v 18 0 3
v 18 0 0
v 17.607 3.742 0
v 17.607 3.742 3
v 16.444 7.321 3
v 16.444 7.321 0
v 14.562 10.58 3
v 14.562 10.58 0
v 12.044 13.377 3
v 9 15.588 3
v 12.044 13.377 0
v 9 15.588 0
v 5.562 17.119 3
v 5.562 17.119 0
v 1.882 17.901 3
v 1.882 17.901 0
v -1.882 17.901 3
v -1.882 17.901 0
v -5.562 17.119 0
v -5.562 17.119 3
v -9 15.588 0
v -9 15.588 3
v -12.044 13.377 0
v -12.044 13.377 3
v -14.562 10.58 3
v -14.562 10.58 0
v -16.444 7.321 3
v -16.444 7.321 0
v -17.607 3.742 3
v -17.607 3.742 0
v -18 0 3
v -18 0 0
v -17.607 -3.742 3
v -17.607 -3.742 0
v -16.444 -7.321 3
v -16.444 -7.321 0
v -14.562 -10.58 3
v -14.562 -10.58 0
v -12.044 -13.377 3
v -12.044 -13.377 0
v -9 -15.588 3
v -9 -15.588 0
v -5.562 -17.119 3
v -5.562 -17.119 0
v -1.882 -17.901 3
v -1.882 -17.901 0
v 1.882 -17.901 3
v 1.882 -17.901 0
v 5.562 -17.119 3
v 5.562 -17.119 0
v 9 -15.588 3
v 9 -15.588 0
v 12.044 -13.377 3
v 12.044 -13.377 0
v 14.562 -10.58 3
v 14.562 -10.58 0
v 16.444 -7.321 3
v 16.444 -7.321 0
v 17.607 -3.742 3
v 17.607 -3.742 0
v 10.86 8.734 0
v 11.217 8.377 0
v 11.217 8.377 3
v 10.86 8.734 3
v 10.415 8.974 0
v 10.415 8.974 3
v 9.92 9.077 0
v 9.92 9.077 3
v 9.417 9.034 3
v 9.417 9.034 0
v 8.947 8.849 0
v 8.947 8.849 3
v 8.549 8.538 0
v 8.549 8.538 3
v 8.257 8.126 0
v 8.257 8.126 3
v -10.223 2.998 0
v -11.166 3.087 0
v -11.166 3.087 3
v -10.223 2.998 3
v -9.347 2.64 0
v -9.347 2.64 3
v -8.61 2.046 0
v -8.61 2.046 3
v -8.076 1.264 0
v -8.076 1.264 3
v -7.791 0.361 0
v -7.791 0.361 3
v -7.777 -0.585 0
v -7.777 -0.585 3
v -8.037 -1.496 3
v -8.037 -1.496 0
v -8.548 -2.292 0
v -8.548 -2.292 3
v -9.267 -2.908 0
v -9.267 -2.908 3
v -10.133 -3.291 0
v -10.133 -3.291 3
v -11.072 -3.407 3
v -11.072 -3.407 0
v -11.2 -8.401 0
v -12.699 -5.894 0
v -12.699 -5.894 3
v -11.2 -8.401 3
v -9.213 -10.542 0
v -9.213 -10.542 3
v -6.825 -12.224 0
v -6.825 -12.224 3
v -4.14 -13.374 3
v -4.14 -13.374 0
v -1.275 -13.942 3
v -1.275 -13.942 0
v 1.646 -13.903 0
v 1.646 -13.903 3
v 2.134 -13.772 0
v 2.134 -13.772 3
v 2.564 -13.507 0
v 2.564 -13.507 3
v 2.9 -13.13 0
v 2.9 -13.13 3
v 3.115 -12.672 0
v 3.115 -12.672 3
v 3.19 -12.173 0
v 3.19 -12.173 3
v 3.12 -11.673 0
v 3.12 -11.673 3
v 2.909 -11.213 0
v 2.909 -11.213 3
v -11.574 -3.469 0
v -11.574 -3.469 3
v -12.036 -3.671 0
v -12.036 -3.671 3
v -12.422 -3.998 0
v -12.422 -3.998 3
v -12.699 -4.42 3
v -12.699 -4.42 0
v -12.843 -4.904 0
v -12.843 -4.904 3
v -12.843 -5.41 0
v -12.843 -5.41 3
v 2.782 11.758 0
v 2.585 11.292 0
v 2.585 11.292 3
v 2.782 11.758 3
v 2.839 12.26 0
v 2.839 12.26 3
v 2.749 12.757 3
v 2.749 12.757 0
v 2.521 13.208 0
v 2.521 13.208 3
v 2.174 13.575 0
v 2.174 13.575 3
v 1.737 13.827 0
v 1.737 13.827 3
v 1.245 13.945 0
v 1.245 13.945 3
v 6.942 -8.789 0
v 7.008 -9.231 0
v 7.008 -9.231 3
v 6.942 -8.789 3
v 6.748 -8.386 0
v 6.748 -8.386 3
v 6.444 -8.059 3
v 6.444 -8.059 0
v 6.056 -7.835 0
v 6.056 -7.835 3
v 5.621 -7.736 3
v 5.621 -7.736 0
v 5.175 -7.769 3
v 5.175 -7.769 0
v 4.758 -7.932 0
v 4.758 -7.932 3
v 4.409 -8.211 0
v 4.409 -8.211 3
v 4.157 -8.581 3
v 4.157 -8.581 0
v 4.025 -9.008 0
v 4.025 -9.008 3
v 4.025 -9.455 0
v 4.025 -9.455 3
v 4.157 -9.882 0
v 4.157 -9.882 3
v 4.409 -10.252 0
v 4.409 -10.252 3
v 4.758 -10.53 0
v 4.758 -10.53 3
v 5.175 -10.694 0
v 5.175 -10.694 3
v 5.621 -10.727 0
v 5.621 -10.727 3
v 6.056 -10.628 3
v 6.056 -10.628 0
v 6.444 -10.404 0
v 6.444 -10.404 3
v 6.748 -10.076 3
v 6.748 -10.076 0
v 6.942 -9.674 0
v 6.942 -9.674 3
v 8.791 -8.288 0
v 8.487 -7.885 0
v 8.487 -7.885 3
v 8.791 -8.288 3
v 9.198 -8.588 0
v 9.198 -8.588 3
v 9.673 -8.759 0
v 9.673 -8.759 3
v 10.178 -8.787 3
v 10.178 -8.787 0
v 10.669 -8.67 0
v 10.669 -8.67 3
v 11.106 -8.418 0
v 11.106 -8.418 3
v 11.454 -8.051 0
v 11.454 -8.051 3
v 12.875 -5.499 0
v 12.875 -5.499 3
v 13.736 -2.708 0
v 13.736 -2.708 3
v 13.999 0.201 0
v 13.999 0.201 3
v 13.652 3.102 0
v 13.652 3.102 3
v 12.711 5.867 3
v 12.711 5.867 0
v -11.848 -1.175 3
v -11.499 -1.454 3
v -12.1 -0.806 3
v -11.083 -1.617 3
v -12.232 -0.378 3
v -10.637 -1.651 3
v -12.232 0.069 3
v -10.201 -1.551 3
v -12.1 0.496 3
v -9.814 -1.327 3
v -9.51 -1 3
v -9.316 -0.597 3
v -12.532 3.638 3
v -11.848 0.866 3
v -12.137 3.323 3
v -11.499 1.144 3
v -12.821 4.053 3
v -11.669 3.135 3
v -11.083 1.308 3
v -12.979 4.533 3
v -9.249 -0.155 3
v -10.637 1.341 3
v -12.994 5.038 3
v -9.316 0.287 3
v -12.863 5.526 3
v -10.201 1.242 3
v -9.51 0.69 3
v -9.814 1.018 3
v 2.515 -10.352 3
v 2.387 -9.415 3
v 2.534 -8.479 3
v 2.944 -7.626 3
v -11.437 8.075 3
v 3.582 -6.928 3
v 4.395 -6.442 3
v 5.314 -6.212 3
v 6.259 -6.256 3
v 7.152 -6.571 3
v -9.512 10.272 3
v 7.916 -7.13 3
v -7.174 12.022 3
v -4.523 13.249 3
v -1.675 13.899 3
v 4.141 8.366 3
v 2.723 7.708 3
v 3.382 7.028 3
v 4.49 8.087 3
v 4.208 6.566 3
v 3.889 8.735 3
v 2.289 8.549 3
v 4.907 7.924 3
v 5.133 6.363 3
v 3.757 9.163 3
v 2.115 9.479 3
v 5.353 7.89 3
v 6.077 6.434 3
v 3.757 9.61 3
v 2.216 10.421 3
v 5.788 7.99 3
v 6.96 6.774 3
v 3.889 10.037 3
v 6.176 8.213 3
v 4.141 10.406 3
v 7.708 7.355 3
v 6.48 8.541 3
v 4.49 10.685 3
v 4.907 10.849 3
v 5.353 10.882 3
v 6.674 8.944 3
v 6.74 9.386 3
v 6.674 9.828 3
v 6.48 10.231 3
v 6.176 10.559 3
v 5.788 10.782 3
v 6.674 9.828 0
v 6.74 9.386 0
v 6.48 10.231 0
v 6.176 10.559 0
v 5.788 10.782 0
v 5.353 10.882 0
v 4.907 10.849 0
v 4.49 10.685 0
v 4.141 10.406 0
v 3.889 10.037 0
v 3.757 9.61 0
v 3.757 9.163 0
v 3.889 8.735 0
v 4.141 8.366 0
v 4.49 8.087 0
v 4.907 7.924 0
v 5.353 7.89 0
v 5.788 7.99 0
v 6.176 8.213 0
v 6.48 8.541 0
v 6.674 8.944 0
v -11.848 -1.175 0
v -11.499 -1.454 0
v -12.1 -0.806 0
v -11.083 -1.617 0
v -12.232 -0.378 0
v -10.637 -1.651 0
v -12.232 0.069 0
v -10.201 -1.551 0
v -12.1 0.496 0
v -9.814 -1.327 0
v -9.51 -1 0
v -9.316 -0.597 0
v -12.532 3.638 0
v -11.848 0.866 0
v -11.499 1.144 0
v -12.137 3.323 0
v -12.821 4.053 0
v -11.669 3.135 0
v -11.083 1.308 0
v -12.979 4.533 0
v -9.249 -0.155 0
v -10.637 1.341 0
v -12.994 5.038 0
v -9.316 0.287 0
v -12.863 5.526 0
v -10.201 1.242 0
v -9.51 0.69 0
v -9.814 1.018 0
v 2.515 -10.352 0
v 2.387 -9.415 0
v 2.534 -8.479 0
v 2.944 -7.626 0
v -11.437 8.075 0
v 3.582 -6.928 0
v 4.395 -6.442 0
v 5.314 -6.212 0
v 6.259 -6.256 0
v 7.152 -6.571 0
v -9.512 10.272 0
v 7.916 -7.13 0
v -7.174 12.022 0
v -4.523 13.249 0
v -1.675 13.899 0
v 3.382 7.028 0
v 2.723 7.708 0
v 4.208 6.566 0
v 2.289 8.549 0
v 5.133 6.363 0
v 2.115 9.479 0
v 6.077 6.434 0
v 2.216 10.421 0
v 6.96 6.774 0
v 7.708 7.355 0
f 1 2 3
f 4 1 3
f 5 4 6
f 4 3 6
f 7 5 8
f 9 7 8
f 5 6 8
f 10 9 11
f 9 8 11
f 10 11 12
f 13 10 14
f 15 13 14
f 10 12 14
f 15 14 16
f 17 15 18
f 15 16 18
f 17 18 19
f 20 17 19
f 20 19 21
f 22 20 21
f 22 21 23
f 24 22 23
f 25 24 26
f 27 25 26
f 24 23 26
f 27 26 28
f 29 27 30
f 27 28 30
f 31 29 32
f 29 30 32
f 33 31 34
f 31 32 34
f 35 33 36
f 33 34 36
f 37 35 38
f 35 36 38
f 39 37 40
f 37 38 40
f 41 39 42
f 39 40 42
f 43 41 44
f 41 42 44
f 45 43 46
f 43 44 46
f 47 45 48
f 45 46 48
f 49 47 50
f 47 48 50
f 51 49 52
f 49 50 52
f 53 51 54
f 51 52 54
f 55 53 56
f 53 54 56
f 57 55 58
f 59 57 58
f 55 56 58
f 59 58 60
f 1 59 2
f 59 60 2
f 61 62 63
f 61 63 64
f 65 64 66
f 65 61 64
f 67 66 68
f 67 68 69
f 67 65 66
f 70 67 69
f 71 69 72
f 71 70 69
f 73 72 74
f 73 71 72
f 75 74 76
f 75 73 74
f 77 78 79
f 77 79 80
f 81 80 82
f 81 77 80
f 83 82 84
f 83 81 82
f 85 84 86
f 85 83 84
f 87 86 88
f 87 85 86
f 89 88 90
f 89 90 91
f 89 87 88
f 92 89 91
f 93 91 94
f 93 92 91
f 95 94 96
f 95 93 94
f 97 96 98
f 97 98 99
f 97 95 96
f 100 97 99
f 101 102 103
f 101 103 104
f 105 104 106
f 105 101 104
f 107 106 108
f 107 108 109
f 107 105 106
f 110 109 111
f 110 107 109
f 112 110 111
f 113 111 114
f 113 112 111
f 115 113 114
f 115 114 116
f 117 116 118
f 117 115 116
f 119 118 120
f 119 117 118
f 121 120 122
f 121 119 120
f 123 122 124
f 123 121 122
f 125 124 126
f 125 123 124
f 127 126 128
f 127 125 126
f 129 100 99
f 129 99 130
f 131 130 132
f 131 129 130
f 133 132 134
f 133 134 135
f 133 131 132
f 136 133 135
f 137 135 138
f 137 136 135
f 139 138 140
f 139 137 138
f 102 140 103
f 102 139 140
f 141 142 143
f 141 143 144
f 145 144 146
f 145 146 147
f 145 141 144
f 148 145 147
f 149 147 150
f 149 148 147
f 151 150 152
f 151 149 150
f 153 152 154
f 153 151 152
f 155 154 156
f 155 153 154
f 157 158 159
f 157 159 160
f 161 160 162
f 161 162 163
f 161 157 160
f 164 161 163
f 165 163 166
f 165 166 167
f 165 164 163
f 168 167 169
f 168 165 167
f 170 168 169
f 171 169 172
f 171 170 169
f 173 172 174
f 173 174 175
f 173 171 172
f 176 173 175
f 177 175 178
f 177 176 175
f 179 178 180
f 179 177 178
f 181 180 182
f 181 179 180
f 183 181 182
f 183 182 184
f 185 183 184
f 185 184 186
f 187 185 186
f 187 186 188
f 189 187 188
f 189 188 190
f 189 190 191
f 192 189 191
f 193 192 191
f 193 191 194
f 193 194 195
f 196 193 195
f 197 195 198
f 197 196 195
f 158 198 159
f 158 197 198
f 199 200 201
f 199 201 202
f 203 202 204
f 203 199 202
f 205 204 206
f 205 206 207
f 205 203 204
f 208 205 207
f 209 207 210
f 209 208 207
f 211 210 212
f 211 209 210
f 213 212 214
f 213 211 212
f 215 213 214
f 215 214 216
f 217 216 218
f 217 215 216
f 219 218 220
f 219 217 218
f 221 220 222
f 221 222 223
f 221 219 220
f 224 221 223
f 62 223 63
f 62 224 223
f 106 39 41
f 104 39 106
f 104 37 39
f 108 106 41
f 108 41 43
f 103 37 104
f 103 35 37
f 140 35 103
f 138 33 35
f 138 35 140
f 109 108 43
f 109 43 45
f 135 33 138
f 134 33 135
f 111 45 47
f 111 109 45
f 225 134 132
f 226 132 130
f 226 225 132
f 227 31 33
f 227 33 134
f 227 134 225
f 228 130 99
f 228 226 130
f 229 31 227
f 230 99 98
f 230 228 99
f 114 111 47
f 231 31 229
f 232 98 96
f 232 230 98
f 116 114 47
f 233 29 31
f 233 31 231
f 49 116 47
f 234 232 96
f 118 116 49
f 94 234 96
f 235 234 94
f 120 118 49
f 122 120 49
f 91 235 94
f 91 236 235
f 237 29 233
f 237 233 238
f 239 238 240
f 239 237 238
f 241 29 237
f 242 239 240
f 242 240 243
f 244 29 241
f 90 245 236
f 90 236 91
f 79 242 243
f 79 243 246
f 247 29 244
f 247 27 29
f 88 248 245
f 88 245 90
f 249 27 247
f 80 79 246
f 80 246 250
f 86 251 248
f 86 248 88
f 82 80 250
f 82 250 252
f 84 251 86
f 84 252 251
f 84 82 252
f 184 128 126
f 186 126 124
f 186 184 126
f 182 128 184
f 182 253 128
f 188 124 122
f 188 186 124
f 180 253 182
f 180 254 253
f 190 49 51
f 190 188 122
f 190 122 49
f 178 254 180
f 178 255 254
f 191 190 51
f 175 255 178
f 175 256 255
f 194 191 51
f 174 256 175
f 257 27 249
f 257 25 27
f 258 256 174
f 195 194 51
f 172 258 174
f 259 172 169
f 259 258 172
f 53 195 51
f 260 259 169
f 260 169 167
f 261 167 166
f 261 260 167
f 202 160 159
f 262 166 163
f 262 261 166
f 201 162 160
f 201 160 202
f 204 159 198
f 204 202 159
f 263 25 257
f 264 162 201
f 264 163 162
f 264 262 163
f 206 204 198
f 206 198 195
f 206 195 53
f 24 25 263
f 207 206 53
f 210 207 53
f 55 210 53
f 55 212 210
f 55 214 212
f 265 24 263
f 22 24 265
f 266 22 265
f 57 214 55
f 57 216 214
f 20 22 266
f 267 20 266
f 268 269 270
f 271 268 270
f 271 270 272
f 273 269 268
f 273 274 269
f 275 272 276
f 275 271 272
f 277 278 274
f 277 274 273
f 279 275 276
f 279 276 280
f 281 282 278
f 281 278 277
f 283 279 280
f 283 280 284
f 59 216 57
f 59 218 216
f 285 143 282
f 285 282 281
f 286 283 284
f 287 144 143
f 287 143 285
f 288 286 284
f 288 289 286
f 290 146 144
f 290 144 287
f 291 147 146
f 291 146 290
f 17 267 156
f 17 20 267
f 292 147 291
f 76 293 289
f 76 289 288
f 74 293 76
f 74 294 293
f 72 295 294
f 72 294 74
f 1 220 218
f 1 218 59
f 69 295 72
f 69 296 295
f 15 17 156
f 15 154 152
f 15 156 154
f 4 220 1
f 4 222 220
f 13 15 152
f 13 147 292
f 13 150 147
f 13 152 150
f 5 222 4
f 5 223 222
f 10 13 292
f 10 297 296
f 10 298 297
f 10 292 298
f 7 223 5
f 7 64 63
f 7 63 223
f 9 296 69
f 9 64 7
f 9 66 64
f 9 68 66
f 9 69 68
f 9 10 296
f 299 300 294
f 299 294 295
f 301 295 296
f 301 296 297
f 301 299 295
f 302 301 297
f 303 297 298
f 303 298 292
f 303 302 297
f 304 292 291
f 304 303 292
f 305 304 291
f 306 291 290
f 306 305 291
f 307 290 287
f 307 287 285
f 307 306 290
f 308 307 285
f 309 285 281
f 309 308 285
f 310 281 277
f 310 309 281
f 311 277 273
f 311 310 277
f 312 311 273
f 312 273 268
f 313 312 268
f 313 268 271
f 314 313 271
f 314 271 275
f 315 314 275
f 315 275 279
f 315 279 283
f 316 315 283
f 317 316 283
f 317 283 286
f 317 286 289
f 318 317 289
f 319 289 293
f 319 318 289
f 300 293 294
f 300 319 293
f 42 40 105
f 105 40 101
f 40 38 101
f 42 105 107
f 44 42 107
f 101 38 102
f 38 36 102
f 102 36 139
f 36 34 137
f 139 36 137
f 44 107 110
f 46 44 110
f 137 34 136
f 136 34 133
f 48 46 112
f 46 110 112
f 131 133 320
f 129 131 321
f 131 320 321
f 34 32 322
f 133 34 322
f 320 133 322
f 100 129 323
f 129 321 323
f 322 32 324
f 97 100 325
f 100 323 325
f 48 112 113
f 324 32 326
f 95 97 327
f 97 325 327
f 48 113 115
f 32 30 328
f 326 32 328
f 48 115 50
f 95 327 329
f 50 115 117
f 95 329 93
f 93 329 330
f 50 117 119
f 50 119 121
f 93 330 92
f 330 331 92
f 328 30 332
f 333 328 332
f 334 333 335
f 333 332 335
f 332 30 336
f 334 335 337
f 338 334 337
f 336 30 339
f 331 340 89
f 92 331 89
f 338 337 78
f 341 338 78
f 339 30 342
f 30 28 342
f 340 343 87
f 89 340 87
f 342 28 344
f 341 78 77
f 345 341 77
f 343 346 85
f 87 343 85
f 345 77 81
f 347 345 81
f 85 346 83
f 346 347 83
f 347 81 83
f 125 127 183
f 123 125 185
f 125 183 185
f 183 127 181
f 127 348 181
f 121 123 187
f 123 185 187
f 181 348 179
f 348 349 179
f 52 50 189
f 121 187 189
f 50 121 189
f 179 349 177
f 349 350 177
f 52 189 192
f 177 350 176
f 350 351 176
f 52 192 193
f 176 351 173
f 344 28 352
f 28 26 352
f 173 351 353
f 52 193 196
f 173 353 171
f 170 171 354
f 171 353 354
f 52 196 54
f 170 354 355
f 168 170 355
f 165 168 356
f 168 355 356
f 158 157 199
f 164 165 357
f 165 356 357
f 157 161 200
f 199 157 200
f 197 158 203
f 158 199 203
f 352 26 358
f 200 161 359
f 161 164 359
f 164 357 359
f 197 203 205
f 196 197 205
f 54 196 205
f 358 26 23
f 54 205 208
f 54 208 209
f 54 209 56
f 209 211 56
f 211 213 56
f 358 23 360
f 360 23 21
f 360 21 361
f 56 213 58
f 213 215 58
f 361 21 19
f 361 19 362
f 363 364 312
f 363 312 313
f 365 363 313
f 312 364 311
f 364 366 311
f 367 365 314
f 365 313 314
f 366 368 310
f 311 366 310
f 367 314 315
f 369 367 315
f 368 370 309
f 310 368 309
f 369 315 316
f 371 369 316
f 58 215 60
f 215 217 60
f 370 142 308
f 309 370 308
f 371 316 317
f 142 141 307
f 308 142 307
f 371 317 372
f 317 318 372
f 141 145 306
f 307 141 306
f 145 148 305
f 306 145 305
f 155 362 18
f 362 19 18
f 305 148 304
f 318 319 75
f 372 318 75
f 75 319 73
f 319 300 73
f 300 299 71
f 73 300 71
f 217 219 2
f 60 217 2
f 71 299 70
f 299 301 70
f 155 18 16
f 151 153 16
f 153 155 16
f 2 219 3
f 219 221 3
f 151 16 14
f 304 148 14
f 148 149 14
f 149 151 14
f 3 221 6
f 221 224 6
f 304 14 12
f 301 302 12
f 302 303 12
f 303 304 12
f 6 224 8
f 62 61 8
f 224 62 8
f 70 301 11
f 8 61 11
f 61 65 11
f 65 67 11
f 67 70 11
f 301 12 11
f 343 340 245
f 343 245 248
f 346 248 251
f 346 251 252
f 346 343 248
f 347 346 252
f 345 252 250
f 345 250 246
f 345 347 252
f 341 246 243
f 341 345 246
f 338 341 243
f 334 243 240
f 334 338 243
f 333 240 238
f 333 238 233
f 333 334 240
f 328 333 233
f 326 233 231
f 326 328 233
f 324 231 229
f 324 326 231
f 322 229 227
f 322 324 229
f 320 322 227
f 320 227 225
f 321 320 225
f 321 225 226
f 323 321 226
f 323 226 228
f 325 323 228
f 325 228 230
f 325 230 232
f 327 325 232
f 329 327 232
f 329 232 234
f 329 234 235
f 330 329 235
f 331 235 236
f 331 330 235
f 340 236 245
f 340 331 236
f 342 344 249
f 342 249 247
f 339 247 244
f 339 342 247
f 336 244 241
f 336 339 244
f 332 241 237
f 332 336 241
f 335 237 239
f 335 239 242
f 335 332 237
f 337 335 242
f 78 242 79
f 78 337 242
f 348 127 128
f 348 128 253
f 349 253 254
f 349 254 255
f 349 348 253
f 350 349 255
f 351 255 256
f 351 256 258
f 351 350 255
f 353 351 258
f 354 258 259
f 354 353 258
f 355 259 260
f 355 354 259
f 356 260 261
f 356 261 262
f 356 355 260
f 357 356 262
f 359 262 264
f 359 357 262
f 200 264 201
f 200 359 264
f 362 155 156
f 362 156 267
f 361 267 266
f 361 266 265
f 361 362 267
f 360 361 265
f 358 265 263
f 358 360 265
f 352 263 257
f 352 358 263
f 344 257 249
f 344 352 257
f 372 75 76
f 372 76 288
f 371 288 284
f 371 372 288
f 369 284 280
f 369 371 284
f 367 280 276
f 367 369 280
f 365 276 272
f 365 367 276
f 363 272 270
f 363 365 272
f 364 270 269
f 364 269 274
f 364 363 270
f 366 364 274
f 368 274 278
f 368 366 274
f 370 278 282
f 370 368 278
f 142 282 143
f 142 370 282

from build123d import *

# Parameters (mm, degrees)
ESQUISSE1_R        = 18
ESQUISSE1_R_2      = 1.5
BOSS_EXTRU_1_DEPTH = 3


with BuildPart() as part:
    # Esquisse1 → Boss.-Extru.1 (new body)
    with BuildSketch(Plane.XY):
        Circle(ESQUISSE1_R)
        with Locations((5.240453276, 9.386167986)):
            Circle(ESQUISSE1_R_2, mode=Mode.SUBTRACT)
        with Locations((5.508433282, -9.231449657)):
            Circle(ESQUISSE1_R_2, mode=Mode.SUBTRACT)
        with Locations((-10.748886558, -0.154718329)):
            Circle(ESQUISSE1_R_2, mode=Mode.SUBTRACT)
        with BuildLine():
            ThreePointArc((11.453630047, -8.050736534), (13.998549936, 0.201493638), (11.217170127, 8.377057619))
            ThreePointArc((11.217170127, 8.377057619), (9.667160345, 9.073667479), (8.256579008, 8.126009358))
            ThreePointArc((8.256579008, 8.126009358), (3.778001199, 6.766772269), (2.58509342, 11.292493835))
            ThreePointArc((2.58509342, 11.292493835), (2.651653429, 12.990541357), (1.245327334, 13.944502853))
            ThreePointArc((1.245327334, 13.944502853), (-7.173773577, 12.022353042), (-12.86332977, 5.525825479))
            ThreePointArc((-12.86332977, 5.525825479), (-12.691606715, 3.835172702), (-11.165620039, 3.087402491))
            ThreePointArc((-11.165620039, 3.087402491), (-7.749197286, -0.111541121), (-11.072133243, -3.407490345))
            ThreePointArc((-11.072133243, -3.407490345), (-12.575965538, -4.198871447), (-12.698957381, -5.893766319))
            ThreePointArc((-12.698957381, -5.893766319), (-6.824776359, -12.22384668), (1.646159643, -13.902883098))
            ThreePointArc((1.646159643, -13.902883098), (3.02444637, -12.90884018), (2.909041031, -11.213411848))
            ThreePointArc((2.909041031, -11.213411848), (3.971196087, -6.655231148), (8.487039823, -7.88500349))
            ThreePointArc((8.487039823, -7.88500349), (9.92431211, -8.79166991), (11.453630047, -8.050736534))
        make_face(mode=Mode.SUBTRACT)
    extrude(amount=BOSS_EXTRU_1_DEPTH)


solid = part.part
